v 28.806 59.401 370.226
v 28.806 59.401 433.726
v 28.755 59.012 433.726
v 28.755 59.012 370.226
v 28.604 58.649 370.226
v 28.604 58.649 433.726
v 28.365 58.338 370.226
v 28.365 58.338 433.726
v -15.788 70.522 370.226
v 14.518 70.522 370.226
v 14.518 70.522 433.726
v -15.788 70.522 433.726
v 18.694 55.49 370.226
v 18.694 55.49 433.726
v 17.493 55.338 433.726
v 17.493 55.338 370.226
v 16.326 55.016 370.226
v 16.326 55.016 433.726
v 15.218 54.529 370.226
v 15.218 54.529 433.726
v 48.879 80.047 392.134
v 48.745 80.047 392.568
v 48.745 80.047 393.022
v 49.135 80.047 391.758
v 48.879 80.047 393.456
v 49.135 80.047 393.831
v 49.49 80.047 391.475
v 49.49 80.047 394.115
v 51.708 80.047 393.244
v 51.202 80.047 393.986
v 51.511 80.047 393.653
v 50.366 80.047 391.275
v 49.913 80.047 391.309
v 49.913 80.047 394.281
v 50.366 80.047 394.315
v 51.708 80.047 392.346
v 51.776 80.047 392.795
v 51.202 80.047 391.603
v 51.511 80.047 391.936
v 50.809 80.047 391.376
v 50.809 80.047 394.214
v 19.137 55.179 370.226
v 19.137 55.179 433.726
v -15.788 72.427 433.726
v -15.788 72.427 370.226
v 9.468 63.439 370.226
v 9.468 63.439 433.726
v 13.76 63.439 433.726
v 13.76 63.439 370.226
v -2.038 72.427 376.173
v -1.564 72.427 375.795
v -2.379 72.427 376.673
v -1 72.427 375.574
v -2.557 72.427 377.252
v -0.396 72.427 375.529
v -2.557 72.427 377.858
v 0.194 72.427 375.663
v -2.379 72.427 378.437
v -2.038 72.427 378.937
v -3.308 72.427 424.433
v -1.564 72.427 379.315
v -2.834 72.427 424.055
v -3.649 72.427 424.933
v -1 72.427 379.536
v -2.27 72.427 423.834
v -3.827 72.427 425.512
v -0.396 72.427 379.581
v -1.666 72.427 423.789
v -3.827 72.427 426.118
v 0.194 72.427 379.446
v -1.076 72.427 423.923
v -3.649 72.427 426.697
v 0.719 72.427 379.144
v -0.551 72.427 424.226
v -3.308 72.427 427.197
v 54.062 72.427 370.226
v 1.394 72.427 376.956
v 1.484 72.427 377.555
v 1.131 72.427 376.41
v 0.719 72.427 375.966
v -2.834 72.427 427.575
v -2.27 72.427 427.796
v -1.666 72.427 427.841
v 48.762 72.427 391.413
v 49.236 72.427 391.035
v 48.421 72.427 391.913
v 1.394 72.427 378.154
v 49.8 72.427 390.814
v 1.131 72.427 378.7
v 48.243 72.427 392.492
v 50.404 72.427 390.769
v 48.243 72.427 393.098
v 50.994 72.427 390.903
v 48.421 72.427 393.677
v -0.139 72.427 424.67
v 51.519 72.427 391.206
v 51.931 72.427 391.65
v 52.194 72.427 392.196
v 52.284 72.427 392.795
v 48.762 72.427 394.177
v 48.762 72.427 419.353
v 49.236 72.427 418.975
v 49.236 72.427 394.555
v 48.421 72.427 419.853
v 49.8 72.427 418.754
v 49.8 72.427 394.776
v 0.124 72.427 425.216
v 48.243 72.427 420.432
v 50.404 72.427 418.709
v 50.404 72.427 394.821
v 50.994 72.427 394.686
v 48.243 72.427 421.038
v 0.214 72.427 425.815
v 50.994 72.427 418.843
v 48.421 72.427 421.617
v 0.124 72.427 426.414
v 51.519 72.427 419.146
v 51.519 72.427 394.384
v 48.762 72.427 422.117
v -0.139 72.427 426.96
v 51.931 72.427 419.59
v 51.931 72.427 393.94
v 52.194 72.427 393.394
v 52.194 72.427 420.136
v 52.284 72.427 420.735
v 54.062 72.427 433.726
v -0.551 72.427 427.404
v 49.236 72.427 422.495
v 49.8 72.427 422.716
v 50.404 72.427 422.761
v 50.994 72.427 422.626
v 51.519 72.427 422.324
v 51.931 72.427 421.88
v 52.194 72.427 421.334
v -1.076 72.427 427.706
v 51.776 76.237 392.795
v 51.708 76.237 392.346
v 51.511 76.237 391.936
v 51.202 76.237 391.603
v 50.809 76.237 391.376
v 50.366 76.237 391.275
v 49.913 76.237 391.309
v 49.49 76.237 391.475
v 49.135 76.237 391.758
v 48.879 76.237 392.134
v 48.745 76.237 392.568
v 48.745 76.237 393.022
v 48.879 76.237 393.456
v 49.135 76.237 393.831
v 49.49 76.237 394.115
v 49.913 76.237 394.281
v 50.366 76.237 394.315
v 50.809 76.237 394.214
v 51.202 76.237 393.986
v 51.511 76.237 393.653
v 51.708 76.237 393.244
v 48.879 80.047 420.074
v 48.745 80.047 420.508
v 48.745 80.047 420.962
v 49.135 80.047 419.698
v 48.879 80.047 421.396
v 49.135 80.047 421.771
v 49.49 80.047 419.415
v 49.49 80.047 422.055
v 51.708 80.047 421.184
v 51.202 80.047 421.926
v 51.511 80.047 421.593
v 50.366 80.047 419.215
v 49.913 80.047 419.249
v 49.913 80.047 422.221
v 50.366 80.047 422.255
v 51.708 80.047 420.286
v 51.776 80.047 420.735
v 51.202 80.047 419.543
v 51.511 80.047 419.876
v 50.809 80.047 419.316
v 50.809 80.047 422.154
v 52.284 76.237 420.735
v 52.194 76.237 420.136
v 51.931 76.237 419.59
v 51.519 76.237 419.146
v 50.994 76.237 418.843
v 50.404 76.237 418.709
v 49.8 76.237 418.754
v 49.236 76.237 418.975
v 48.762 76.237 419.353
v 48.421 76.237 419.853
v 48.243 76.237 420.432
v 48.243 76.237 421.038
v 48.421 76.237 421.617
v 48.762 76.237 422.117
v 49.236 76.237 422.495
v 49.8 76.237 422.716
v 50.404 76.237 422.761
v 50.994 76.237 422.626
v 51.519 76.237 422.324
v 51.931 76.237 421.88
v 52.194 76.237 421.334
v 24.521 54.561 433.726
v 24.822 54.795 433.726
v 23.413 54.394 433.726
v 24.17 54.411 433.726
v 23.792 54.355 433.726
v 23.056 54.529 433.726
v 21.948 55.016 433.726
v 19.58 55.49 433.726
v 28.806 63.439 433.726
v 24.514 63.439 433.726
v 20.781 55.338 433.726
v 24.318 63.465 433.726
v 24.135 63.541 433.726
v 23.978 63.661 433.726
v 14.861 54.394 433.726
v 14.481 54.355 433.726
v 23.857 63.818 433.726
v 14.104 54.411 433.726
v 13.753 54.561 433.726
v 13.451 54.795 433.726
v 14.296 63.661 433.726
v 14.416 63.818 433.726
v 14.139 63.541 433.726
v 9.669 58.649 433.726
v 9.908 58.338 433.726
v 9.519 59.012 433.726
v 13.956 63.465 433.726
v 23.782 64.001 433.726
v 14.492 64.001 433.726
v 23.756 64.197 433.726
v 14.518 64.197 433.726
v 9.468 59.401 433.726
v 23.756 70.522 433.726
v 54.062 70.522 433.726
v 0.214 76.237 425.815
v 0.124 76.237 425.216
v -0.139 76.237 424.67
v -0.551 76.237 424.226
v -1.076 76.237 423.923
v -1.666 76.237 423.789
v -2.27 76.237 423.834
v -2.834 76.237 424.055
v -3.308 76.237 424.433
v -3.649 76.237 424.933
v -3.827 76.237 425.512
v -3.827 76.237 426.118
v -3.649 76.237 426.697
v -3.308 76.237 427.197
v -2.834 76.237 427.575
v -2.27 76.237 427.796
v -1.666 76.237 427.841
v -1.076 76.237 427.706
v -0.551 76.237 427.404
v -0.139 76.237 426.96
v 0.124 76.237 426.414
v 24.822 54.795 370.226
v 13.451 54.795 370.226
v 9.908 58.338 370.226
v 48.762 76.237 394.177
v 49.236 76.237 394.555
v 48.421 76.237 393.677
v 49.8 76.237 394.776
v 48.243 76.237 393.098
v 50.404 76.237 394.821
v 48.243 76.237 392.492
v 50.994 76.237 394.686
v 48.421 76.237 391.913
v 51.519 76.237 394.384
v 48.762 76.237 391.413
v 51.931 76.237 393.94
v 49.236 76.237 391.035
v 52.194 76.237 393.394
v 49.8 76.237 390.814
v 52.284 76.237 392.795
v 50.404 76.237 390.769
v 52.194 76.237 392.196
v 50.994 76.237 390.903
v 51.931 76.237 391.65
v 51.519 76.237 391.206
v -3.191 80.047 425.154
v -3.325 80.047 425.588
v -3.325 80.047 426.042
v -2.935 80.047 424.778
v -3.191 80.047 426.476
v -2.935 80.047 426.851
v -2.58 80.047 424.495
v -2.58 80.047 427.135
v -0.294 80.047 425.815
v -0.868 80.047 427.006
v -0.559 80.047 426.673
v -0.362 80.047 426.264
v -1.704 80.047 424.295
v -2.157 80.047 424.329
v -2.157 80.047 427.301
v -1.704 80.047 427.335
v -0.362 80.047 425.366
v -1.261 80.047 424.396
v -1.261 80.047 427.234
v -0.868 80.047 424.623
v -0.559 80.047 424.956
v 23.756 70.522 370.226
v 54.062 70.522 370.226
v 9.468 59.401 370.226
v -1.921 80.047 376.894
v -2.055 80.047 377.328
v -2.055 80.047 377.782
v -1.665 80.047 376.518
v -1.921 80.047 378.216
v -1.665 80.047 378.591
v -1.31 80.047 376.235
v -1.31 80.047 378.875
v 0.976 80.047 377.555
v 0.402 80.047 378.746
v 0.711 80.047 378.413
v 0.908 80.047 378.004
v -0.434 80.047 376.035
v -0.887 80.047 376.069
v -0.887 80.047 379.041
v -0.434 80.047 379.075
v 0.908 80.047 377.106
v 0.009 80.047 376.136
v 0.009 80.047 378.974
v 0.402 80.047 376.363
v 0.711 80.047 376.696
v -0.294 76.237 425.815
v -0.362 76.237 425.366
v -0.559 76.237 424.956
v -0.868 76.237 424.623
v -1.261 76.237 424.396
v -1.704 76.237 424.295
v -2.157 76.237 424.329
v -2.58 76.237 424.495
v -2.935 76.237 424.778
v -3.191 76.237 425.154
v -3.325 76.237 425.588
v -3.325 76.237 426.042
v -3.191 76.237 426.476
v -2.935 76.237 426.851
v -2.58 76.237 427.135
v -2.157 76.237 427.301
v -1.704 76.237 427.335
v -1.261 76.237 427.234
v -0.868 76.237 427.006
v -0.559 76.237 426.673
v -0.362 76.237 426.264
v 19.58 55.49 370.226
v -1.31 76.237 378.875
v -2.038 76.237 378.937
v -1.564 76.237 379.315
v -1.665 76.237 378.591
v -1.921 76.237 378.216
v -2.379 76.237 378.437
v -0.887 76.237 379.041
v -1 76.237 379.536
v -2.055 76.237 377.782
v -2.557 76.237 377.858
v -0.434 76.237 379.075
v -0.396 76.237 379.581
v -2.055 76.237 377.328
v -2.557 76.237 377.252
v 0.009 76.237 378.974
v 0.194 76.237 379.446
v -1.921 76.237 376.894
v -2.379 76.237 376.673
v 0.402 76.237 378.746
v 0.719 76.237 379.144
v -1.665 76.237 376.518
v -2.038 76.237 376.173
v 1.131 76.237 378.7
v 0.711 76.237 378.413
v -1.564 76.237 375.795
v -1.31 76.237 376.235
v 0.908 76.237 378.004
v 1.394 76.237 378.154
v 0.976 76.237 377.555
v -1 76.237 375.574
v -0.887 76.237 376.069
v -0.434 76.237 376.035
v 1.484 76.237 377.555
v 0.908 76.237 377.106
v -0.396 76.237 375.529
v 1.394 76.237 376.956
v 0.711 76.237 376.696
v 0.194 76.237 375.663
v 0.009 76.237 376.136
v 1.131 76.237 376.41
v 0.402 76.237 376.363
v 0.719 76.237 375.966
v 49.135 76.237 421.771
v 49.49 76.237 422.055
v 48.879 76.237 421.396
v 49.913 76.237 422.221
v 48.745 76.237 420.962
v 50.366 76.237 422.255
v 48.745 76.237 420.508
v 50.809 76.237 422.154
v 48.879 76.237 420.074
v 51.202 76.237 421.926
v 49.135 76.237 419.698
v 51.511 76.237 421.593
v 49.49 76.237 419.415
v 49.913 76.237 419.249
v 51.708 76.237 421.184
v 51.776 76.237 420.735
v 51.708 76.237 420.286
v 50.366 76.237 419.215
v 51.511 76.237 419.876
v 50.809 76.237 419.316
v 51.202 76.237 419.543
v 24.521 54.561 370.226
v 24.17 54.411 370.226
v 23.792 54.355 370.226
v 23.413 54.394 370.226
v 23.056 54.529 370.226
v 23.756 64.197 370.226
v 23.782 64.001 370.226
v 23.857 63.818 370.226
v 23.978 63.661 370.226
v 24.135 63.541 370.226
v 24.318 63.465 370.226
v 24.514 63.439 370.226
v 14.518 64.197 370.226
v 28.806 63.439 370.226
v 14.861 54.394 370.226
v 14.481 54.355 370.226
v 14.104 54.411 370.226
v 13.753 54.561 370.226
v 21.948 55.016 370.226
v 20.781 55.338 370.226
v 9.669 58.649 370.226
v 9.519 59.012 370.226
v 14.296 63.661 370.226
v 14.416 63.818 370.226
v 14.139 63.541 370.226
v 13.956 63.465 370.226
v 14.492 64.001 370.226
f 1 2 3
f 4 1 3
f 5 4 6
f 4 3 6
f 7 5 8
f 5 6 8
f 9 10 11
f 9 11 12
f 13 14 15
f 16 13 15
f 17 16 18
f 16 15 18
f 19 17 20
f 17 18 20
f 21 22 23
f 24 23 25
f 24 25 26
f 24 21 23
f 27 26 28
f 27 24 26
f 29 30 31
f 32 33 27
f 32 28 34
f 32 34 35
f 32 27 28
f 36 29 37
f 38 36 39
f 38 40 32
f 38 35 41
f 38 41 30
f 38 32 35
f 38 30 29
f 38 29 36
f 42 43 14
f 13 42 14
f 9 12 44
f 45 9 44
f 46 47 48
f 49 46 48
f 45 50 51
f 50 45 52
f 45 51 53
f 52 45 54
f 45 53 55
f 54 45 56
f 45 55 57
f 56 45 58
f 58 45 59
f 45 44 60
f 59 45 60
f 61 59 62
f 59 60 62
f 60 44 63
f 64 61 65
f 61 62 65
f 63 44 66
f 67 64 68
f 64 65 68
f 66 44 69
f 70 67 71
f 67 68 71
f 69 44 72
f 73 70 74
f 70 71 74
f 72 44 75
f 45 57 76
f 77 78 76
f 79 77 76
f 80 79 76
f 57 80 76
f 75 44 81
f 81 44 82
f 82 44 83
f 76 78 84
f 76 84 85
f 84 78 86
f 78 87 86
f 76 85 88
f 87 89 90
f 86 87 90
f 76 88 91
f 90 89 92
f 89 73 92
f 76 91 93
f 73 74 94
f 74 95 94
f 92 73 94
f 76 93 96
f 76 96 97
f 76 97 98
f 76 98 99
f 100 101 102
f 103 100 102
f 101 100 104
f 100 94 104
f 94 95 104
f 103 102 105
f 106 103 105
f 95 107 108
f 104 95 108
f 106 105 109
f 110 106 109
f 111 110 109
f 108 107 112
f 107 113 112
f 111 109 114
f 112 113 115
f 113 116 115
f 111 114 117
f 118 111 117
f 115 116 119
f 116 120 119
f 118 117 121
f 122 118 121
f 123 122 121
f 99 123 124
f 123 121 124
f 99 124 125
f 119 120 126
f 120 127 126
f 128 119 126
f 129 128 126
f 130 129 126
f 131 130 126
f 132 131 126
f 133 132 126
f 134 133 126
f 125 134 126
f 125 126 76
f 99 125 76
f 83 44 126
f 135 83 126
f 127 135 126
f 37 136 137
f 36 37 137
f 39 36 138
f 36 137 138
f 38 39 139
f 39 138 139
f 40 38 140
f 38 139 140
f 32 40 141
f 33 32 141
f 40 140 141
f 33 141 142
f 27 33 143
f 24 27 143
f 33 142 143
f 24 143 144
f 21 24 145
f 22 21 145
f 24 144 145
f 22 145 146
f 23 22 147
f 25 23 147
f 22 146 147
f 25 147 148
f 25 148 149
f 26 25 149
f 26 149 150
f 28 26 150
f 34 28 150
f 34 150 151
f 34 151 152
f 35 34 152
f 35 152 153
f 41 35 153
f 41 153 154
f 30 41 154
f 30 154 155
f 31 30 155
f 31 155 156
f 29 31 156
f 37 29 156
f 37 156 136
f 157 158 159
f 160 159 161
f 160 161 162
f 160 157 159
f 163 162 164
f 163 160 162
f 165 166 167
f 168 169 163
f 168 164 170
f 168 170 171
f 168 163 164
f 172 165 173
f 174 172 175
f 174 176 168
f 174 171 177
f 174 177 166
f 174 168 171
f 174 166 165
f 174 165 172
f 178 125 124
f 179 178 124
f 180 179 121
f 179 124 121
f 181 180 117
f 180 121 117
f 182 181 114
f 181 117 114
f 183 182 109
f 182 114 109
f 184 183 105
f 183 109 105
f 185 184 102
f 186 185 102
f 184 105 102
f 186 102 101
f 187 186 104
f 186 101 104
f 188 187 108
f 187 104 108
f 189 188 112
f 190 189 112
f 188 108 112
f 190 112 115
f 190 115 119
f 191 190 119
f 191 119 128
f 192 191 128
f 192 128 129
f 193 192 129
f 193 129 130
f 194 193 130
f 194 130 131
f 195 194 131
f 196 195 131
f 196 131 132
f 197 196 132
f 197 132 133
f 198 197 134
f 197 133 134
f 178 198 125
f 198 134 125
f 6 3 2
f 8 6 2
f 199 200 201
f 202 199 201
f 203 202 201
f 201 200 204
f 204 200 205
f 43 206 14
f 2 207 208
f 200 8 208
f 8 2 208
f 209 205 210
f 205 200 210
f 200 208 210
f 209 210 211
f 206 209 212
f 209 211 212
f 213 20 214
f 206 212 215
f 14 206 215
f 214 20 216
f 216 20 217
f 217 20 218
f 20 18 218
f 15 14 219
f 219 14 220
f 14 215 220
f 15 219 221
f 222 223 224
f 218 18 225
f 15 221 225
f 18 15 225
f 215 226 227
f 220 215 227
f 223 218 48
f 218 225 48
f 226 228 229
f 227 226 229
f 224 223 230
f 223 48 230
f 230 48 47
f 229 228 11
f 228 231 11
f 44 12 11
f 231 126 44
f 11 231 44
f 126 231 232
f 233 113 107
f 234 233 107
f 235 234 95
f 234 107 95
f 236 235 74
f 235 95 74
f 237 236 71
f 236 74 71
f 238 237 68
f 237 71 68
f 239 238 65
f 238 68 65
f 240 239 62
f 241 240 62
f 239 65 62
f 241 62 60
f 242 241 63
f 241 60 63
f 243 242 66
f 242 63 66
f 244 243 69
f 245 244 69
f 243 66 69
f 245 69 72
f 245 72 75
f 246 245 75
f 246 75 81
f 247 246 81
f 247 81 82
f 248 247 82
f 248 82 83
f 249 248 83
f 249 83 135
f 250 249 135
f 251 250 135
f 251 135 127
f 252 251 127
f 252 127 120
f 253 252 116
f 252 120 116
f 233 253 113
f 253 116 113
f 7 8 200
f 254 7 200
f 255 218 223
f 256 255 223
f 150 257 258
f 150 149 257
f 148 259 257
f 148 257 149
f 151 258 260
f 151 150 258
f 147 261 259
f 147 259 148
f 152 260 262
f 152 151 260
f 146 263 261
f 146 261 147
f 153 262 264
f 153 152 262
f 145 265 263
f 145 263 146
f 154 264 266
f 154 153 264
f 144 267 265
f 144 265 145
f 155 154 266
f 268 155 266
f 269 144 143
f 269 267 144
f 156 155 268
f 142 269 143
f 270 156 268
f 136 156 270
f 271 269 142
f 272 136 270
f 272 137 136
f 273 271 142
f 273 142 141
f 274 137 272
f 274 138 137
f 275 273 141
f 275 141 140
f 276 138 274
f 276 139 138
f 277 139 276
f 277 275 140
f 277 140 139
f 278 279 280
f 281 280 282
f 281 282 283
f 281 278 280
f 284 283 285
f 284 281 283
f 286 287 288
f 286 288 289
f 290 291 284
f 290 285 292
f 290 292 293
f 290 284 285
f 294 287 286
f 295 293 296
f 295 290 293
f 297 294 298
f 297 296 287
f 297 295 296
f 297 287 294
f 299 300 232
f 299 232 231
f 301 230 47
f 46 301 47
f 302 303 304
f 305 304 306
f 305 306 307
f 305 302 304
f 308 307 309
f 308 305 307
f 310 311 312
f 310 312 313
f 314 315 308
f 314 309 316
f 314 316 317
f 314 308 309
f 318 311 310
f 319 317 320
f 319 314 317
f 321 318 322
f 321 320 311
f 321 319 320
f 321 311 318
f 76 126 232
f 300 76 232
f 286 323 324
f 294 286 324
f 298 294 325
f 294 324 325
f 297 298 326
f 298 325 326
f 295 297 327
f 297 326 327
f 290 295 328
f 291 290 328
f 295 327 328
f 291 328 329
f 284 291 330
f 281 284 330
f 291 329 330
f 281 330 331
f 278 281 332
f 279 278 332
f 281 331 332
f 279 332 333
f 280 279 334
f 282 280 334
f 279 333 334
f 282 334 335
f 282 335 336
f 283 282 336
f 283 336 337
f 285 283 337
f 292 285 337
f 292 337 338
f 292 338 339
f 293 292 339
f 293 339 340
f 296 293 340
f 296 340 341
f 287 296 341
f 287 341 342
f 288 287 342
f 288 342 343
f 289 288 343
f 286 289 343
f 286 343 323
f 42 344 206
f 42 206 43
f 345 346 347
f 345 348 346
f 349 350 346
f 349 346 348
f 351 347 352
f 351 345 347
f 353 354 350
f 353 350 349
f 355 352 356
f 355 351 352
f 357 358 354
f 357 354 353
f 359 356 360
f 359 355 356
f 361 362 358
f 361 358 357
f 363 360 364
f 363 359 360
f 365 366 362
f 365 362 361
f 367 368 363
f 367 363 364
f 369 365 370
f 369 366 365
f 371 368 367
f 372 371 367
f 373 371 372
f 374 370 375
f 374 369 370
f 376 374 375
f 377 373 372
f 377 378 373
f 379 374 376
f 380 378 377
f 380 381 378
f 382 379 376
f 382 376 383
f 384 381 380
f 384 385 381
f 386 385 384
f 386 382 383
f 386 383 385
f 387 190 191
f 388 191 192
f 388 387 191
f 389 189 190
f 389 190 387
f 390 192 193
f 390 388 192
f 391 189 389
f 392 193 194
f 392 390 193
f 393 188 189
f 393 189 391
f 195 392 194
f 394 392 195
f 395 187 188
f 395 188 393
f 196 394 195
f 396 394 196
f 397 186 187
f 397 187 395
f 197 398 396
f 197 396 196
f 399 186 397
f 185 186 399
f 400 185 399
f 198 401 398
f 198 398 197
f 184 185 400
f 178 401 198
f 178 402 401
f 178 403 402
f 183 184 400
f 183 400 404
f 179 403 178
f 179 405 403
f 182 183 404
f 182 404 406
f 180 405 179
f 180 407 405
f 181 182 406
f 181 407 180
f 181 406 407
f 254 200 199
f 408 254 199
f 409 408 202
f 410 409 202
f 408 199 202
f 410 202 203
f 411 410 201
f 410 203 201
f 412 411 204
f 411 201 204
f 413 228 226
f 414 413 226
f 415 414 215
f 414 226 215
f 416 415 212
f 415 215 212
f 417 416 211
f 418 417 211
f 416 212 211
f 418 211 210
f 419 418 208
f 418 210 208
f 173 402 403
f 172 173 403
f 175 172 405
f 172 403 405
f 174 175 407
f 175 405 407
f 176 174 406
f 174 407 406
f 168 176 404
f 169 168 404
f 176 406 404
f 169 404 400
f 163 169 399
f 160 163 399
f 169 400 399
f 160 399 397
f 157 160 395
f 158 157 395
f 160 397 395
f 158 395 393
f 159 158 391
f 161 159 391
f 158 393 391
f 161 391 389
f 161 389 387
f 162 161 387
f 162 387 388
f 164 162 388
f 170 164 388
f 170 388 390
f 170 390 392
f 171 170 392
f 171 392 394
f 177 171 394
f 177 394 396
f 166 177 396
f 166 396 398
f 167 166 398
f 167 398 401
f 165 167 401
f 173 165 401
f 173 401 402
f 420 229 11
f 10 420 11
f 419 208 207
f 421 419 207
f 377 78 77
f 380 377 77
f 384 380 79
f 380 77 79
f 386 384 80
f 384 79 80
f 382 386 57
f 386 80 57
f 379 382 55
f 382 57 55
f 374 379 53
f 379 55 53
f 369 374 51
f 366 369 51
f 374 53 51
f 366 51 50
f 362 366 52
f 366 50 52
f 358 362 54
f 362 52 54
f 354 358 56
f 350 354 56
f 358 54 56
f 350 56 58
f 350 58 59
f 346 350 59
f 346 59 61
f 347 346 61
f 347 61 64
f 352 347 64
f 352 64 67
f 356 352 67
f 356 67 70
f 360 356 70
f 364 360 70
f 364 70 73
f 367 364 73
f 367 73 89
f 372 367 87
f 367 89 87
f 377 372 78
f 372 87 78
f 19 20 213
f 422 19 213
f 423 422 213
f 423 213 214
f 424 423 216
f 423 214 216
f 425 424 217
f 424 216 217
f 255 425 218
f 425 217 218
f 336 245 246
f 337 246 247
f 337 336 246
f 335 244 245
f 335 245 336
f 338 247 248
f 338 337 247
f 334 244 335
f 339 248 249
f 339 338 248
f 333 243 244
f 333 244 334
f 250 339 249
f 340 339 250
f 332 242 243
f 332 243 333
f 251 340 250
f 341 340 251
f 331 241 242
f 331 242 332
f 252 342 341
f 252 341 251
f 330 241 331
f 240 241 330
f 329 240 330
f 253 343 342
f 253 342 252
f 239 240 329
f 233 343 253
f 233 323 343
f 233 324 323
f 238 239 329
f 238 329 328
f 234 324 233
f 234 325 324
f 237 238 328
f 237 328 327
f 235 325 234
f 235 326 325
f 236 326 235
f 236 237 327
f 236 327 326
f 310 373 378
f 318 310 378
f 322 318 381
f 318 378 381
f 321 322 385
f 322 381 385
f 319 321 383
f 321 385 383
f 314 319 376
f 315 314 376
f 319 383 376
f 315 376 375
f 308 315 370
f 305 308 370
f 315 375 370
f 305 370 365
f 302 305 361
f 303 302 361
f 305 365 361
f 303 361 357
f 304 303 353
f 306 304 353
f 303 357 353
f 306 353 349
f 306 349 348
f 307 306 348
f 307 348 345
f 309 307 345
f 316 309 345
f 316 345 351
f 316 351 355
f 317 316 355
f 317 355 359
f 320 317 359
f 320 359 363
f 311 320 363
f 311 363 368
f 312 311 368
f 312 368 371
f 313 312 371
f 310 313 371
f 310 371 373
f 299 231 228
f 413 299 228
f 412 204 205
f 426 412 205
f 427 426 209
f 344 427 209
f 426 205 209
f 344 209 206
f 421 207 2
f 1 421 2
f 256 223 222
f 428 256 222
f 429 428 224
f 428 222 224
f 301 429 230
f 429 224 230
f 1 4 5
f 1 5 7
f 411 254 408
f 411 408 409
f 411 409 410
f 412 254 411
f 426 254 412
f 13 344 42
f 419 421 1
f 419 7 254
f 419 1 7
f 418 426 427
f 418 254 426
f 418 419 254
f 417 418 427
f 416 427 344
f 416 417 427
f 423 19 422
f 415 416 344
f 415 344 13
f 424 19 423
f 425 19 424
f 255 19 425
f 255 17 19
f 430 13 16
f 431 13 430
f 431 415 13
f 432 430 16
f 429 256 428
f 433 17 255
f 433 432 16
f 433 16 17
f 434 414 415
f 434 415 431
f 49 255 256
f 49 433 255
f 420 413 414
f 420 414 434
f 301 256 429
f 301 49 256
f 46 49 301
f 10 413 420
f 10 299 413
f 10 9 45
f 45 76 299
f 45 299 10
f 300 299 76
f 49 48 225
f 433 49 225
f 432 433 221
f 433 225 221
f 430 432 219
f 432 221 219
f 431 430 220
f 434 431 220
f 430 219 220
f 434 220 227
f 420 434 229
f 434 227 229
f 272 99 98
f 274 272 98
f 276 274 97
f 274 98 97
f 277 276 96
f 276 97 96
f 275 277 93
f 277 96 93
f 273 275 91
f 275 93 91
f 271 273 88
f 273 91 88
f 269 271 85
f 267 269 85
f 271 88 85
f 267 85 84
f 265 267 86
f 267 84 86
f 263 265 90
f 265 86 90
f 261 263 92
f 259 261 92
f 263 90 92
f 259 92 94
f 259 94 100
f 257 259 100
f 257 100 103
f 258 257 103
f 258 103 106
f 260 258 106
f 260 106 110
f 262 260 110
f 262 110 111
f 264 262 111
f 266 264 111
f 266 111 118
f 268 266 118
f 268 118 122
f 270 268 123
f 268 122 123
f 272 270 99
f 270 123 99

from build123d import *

# Parameters (mm, degrees)
BOSS_EXTRUDE1_DEPTH = 63.5
SKETCH3_R           = 1.524
BOSS_EXTRUDE2_DEPTH = 7.62
SKETCH4_R           = 2.032
BOSS_EXTRUDE3_DEPTH = 3.81


with BuildPart() as part:
    # Sketch1 → Boss-Extrude1 (new body)
    with BuildSketch(Plane.XY.offset(433.726101294)):
        with BuildLine():
            Line((12.262790096, 63.439286549), (12.817159361, 63.439286549))
            Line((12.817159361, 63.439286549), (13.759849728, 63.439286549))
            ThreePointArc((13.759849728, 63.439286549), (14.295836668, 63.661299609), (14.517849728, 64.197286549))
            Line((14.517849728, 64.197286549), (14.517849728, 67.981786549))
            Line((14.517849728, 67.981786549), (14.517849728, 70.521786549))
            Line((14.517849728, 70.521786549), (-15.788150272, 70.521786549))
            Line((-15.788150272, 70.521786549), (-15.788150272, 72.426786549))
            Line((-15.788150272, 72.426786549), (54.061849728, 72.426786549))
            Line((54.061849728, 72.426786549), (54.061849728, 70.521786549))
            Line((54.061849728, 70.521786549), (23.755849728, 70.521786549))
            Line((23.755849728, 70.521786549), (23.755849728, 67.981786549))
            Line((23.755849728, 67.981786549), (23.755849728, 64.197286549))
            ThreePointArc((23.755849728, 64.197286549), (23.977862788, 63.661299609), (24.513849728, 63.439286549))
            Line((24.513849728, 63.439286549), (28.805849728, 63.439286549))
            Line((28.805849728, 63.439286549), (28.805849728, 59.401079114))
            ThreePointArc((28.805849728, 59.401079114), (28.691364545, 58.825523232), (28.365338327, 58.337590516))
            Line((28.365338327, 58.337590516), (24.822387807, 54.794639996))
            ThreePointArc((24.822387807, 54.794639996), (23.982795062, 54.370887307), (23.055655666, 54.528668358))
            ThreePointArc((23.055655666, 54.528668358), (21.370192512, 55.198240561), (19.580150838, 55.489554446))
            Line((19.580150838, 55.489554446), (19.136849728, 55.179151668))
            Line((19.136849728, 55.179151668), (18.693548619, 55.489554446))
            ThreePointArc((18.693548619, 55.489554446), (16.903506945, 55.198240561), (15.218043791, 54.528668358))
            ThreePointArc((15.218043791, 54.528668358), (14.290904395, 54.370887307), (13.451311649, 54.794639996))
            Line((13.451311649, 54.794639996), (9.908361129, 58.337590516))
            ThreePointArc((9.908361129, 58.337590516), (9.582334911, 58.825523232), (9.467849728, 59.401079114))
            Line((9.467849728, 59.401079114), (9.467849728, 63.439286549))
            Line((9.467849728, 63.439286549), (12.262790096, 63.439286549))
        make_face()
    extrude(amount=-BOSS_EXTRUDE1_DEPTH)

    # Sketch3 → Boss-Extrude2 (add)
    with BuildSketch(Plane(origin=(0, 72.426786549, 0), x_dir=(1, 0, 0), z_dir=(0, 1, 0))):
        with Locations((-0.548150272, -377.554863046)):
            Circle(SKETCH3_R)
        with Locations((50.251849728, -392.794863046)):
            Circle(SKETCH3_R)
        with Locations((50.251849728, -420.734863046)):
            Circle(SKETCH3_R)
        with Locations((-1.818150272, -425.814863046)):
            Circle(SKETCH3_R)
    extrude(amount=BOSS_EXTRUDE2_DEPTH)

    # Sketch4 → Boss-Extrude3 (add)
    with BuildSketch(Plane(origin=(0, 72.426786549, 0), x_dir=(1, 0, 0), z_dir=(0, 1, 0))):
        with Locations((-0.548150272, -377.554863046)):
            Circle(SKETCH4_R)
        with Locations((50.251849728, -392.794863046)):
            Circle(SKETCH4_R)
        with Locations((50.251849728, -420.734863046)):
            Circle(SKETCH4_R)
        with Locations((-1.818150272, -425.814863046)):
            Circle(SKETCH4_R)
    extrude(amount=BOSS_EXTRUDE3_DEPTH)


solid = part.part
